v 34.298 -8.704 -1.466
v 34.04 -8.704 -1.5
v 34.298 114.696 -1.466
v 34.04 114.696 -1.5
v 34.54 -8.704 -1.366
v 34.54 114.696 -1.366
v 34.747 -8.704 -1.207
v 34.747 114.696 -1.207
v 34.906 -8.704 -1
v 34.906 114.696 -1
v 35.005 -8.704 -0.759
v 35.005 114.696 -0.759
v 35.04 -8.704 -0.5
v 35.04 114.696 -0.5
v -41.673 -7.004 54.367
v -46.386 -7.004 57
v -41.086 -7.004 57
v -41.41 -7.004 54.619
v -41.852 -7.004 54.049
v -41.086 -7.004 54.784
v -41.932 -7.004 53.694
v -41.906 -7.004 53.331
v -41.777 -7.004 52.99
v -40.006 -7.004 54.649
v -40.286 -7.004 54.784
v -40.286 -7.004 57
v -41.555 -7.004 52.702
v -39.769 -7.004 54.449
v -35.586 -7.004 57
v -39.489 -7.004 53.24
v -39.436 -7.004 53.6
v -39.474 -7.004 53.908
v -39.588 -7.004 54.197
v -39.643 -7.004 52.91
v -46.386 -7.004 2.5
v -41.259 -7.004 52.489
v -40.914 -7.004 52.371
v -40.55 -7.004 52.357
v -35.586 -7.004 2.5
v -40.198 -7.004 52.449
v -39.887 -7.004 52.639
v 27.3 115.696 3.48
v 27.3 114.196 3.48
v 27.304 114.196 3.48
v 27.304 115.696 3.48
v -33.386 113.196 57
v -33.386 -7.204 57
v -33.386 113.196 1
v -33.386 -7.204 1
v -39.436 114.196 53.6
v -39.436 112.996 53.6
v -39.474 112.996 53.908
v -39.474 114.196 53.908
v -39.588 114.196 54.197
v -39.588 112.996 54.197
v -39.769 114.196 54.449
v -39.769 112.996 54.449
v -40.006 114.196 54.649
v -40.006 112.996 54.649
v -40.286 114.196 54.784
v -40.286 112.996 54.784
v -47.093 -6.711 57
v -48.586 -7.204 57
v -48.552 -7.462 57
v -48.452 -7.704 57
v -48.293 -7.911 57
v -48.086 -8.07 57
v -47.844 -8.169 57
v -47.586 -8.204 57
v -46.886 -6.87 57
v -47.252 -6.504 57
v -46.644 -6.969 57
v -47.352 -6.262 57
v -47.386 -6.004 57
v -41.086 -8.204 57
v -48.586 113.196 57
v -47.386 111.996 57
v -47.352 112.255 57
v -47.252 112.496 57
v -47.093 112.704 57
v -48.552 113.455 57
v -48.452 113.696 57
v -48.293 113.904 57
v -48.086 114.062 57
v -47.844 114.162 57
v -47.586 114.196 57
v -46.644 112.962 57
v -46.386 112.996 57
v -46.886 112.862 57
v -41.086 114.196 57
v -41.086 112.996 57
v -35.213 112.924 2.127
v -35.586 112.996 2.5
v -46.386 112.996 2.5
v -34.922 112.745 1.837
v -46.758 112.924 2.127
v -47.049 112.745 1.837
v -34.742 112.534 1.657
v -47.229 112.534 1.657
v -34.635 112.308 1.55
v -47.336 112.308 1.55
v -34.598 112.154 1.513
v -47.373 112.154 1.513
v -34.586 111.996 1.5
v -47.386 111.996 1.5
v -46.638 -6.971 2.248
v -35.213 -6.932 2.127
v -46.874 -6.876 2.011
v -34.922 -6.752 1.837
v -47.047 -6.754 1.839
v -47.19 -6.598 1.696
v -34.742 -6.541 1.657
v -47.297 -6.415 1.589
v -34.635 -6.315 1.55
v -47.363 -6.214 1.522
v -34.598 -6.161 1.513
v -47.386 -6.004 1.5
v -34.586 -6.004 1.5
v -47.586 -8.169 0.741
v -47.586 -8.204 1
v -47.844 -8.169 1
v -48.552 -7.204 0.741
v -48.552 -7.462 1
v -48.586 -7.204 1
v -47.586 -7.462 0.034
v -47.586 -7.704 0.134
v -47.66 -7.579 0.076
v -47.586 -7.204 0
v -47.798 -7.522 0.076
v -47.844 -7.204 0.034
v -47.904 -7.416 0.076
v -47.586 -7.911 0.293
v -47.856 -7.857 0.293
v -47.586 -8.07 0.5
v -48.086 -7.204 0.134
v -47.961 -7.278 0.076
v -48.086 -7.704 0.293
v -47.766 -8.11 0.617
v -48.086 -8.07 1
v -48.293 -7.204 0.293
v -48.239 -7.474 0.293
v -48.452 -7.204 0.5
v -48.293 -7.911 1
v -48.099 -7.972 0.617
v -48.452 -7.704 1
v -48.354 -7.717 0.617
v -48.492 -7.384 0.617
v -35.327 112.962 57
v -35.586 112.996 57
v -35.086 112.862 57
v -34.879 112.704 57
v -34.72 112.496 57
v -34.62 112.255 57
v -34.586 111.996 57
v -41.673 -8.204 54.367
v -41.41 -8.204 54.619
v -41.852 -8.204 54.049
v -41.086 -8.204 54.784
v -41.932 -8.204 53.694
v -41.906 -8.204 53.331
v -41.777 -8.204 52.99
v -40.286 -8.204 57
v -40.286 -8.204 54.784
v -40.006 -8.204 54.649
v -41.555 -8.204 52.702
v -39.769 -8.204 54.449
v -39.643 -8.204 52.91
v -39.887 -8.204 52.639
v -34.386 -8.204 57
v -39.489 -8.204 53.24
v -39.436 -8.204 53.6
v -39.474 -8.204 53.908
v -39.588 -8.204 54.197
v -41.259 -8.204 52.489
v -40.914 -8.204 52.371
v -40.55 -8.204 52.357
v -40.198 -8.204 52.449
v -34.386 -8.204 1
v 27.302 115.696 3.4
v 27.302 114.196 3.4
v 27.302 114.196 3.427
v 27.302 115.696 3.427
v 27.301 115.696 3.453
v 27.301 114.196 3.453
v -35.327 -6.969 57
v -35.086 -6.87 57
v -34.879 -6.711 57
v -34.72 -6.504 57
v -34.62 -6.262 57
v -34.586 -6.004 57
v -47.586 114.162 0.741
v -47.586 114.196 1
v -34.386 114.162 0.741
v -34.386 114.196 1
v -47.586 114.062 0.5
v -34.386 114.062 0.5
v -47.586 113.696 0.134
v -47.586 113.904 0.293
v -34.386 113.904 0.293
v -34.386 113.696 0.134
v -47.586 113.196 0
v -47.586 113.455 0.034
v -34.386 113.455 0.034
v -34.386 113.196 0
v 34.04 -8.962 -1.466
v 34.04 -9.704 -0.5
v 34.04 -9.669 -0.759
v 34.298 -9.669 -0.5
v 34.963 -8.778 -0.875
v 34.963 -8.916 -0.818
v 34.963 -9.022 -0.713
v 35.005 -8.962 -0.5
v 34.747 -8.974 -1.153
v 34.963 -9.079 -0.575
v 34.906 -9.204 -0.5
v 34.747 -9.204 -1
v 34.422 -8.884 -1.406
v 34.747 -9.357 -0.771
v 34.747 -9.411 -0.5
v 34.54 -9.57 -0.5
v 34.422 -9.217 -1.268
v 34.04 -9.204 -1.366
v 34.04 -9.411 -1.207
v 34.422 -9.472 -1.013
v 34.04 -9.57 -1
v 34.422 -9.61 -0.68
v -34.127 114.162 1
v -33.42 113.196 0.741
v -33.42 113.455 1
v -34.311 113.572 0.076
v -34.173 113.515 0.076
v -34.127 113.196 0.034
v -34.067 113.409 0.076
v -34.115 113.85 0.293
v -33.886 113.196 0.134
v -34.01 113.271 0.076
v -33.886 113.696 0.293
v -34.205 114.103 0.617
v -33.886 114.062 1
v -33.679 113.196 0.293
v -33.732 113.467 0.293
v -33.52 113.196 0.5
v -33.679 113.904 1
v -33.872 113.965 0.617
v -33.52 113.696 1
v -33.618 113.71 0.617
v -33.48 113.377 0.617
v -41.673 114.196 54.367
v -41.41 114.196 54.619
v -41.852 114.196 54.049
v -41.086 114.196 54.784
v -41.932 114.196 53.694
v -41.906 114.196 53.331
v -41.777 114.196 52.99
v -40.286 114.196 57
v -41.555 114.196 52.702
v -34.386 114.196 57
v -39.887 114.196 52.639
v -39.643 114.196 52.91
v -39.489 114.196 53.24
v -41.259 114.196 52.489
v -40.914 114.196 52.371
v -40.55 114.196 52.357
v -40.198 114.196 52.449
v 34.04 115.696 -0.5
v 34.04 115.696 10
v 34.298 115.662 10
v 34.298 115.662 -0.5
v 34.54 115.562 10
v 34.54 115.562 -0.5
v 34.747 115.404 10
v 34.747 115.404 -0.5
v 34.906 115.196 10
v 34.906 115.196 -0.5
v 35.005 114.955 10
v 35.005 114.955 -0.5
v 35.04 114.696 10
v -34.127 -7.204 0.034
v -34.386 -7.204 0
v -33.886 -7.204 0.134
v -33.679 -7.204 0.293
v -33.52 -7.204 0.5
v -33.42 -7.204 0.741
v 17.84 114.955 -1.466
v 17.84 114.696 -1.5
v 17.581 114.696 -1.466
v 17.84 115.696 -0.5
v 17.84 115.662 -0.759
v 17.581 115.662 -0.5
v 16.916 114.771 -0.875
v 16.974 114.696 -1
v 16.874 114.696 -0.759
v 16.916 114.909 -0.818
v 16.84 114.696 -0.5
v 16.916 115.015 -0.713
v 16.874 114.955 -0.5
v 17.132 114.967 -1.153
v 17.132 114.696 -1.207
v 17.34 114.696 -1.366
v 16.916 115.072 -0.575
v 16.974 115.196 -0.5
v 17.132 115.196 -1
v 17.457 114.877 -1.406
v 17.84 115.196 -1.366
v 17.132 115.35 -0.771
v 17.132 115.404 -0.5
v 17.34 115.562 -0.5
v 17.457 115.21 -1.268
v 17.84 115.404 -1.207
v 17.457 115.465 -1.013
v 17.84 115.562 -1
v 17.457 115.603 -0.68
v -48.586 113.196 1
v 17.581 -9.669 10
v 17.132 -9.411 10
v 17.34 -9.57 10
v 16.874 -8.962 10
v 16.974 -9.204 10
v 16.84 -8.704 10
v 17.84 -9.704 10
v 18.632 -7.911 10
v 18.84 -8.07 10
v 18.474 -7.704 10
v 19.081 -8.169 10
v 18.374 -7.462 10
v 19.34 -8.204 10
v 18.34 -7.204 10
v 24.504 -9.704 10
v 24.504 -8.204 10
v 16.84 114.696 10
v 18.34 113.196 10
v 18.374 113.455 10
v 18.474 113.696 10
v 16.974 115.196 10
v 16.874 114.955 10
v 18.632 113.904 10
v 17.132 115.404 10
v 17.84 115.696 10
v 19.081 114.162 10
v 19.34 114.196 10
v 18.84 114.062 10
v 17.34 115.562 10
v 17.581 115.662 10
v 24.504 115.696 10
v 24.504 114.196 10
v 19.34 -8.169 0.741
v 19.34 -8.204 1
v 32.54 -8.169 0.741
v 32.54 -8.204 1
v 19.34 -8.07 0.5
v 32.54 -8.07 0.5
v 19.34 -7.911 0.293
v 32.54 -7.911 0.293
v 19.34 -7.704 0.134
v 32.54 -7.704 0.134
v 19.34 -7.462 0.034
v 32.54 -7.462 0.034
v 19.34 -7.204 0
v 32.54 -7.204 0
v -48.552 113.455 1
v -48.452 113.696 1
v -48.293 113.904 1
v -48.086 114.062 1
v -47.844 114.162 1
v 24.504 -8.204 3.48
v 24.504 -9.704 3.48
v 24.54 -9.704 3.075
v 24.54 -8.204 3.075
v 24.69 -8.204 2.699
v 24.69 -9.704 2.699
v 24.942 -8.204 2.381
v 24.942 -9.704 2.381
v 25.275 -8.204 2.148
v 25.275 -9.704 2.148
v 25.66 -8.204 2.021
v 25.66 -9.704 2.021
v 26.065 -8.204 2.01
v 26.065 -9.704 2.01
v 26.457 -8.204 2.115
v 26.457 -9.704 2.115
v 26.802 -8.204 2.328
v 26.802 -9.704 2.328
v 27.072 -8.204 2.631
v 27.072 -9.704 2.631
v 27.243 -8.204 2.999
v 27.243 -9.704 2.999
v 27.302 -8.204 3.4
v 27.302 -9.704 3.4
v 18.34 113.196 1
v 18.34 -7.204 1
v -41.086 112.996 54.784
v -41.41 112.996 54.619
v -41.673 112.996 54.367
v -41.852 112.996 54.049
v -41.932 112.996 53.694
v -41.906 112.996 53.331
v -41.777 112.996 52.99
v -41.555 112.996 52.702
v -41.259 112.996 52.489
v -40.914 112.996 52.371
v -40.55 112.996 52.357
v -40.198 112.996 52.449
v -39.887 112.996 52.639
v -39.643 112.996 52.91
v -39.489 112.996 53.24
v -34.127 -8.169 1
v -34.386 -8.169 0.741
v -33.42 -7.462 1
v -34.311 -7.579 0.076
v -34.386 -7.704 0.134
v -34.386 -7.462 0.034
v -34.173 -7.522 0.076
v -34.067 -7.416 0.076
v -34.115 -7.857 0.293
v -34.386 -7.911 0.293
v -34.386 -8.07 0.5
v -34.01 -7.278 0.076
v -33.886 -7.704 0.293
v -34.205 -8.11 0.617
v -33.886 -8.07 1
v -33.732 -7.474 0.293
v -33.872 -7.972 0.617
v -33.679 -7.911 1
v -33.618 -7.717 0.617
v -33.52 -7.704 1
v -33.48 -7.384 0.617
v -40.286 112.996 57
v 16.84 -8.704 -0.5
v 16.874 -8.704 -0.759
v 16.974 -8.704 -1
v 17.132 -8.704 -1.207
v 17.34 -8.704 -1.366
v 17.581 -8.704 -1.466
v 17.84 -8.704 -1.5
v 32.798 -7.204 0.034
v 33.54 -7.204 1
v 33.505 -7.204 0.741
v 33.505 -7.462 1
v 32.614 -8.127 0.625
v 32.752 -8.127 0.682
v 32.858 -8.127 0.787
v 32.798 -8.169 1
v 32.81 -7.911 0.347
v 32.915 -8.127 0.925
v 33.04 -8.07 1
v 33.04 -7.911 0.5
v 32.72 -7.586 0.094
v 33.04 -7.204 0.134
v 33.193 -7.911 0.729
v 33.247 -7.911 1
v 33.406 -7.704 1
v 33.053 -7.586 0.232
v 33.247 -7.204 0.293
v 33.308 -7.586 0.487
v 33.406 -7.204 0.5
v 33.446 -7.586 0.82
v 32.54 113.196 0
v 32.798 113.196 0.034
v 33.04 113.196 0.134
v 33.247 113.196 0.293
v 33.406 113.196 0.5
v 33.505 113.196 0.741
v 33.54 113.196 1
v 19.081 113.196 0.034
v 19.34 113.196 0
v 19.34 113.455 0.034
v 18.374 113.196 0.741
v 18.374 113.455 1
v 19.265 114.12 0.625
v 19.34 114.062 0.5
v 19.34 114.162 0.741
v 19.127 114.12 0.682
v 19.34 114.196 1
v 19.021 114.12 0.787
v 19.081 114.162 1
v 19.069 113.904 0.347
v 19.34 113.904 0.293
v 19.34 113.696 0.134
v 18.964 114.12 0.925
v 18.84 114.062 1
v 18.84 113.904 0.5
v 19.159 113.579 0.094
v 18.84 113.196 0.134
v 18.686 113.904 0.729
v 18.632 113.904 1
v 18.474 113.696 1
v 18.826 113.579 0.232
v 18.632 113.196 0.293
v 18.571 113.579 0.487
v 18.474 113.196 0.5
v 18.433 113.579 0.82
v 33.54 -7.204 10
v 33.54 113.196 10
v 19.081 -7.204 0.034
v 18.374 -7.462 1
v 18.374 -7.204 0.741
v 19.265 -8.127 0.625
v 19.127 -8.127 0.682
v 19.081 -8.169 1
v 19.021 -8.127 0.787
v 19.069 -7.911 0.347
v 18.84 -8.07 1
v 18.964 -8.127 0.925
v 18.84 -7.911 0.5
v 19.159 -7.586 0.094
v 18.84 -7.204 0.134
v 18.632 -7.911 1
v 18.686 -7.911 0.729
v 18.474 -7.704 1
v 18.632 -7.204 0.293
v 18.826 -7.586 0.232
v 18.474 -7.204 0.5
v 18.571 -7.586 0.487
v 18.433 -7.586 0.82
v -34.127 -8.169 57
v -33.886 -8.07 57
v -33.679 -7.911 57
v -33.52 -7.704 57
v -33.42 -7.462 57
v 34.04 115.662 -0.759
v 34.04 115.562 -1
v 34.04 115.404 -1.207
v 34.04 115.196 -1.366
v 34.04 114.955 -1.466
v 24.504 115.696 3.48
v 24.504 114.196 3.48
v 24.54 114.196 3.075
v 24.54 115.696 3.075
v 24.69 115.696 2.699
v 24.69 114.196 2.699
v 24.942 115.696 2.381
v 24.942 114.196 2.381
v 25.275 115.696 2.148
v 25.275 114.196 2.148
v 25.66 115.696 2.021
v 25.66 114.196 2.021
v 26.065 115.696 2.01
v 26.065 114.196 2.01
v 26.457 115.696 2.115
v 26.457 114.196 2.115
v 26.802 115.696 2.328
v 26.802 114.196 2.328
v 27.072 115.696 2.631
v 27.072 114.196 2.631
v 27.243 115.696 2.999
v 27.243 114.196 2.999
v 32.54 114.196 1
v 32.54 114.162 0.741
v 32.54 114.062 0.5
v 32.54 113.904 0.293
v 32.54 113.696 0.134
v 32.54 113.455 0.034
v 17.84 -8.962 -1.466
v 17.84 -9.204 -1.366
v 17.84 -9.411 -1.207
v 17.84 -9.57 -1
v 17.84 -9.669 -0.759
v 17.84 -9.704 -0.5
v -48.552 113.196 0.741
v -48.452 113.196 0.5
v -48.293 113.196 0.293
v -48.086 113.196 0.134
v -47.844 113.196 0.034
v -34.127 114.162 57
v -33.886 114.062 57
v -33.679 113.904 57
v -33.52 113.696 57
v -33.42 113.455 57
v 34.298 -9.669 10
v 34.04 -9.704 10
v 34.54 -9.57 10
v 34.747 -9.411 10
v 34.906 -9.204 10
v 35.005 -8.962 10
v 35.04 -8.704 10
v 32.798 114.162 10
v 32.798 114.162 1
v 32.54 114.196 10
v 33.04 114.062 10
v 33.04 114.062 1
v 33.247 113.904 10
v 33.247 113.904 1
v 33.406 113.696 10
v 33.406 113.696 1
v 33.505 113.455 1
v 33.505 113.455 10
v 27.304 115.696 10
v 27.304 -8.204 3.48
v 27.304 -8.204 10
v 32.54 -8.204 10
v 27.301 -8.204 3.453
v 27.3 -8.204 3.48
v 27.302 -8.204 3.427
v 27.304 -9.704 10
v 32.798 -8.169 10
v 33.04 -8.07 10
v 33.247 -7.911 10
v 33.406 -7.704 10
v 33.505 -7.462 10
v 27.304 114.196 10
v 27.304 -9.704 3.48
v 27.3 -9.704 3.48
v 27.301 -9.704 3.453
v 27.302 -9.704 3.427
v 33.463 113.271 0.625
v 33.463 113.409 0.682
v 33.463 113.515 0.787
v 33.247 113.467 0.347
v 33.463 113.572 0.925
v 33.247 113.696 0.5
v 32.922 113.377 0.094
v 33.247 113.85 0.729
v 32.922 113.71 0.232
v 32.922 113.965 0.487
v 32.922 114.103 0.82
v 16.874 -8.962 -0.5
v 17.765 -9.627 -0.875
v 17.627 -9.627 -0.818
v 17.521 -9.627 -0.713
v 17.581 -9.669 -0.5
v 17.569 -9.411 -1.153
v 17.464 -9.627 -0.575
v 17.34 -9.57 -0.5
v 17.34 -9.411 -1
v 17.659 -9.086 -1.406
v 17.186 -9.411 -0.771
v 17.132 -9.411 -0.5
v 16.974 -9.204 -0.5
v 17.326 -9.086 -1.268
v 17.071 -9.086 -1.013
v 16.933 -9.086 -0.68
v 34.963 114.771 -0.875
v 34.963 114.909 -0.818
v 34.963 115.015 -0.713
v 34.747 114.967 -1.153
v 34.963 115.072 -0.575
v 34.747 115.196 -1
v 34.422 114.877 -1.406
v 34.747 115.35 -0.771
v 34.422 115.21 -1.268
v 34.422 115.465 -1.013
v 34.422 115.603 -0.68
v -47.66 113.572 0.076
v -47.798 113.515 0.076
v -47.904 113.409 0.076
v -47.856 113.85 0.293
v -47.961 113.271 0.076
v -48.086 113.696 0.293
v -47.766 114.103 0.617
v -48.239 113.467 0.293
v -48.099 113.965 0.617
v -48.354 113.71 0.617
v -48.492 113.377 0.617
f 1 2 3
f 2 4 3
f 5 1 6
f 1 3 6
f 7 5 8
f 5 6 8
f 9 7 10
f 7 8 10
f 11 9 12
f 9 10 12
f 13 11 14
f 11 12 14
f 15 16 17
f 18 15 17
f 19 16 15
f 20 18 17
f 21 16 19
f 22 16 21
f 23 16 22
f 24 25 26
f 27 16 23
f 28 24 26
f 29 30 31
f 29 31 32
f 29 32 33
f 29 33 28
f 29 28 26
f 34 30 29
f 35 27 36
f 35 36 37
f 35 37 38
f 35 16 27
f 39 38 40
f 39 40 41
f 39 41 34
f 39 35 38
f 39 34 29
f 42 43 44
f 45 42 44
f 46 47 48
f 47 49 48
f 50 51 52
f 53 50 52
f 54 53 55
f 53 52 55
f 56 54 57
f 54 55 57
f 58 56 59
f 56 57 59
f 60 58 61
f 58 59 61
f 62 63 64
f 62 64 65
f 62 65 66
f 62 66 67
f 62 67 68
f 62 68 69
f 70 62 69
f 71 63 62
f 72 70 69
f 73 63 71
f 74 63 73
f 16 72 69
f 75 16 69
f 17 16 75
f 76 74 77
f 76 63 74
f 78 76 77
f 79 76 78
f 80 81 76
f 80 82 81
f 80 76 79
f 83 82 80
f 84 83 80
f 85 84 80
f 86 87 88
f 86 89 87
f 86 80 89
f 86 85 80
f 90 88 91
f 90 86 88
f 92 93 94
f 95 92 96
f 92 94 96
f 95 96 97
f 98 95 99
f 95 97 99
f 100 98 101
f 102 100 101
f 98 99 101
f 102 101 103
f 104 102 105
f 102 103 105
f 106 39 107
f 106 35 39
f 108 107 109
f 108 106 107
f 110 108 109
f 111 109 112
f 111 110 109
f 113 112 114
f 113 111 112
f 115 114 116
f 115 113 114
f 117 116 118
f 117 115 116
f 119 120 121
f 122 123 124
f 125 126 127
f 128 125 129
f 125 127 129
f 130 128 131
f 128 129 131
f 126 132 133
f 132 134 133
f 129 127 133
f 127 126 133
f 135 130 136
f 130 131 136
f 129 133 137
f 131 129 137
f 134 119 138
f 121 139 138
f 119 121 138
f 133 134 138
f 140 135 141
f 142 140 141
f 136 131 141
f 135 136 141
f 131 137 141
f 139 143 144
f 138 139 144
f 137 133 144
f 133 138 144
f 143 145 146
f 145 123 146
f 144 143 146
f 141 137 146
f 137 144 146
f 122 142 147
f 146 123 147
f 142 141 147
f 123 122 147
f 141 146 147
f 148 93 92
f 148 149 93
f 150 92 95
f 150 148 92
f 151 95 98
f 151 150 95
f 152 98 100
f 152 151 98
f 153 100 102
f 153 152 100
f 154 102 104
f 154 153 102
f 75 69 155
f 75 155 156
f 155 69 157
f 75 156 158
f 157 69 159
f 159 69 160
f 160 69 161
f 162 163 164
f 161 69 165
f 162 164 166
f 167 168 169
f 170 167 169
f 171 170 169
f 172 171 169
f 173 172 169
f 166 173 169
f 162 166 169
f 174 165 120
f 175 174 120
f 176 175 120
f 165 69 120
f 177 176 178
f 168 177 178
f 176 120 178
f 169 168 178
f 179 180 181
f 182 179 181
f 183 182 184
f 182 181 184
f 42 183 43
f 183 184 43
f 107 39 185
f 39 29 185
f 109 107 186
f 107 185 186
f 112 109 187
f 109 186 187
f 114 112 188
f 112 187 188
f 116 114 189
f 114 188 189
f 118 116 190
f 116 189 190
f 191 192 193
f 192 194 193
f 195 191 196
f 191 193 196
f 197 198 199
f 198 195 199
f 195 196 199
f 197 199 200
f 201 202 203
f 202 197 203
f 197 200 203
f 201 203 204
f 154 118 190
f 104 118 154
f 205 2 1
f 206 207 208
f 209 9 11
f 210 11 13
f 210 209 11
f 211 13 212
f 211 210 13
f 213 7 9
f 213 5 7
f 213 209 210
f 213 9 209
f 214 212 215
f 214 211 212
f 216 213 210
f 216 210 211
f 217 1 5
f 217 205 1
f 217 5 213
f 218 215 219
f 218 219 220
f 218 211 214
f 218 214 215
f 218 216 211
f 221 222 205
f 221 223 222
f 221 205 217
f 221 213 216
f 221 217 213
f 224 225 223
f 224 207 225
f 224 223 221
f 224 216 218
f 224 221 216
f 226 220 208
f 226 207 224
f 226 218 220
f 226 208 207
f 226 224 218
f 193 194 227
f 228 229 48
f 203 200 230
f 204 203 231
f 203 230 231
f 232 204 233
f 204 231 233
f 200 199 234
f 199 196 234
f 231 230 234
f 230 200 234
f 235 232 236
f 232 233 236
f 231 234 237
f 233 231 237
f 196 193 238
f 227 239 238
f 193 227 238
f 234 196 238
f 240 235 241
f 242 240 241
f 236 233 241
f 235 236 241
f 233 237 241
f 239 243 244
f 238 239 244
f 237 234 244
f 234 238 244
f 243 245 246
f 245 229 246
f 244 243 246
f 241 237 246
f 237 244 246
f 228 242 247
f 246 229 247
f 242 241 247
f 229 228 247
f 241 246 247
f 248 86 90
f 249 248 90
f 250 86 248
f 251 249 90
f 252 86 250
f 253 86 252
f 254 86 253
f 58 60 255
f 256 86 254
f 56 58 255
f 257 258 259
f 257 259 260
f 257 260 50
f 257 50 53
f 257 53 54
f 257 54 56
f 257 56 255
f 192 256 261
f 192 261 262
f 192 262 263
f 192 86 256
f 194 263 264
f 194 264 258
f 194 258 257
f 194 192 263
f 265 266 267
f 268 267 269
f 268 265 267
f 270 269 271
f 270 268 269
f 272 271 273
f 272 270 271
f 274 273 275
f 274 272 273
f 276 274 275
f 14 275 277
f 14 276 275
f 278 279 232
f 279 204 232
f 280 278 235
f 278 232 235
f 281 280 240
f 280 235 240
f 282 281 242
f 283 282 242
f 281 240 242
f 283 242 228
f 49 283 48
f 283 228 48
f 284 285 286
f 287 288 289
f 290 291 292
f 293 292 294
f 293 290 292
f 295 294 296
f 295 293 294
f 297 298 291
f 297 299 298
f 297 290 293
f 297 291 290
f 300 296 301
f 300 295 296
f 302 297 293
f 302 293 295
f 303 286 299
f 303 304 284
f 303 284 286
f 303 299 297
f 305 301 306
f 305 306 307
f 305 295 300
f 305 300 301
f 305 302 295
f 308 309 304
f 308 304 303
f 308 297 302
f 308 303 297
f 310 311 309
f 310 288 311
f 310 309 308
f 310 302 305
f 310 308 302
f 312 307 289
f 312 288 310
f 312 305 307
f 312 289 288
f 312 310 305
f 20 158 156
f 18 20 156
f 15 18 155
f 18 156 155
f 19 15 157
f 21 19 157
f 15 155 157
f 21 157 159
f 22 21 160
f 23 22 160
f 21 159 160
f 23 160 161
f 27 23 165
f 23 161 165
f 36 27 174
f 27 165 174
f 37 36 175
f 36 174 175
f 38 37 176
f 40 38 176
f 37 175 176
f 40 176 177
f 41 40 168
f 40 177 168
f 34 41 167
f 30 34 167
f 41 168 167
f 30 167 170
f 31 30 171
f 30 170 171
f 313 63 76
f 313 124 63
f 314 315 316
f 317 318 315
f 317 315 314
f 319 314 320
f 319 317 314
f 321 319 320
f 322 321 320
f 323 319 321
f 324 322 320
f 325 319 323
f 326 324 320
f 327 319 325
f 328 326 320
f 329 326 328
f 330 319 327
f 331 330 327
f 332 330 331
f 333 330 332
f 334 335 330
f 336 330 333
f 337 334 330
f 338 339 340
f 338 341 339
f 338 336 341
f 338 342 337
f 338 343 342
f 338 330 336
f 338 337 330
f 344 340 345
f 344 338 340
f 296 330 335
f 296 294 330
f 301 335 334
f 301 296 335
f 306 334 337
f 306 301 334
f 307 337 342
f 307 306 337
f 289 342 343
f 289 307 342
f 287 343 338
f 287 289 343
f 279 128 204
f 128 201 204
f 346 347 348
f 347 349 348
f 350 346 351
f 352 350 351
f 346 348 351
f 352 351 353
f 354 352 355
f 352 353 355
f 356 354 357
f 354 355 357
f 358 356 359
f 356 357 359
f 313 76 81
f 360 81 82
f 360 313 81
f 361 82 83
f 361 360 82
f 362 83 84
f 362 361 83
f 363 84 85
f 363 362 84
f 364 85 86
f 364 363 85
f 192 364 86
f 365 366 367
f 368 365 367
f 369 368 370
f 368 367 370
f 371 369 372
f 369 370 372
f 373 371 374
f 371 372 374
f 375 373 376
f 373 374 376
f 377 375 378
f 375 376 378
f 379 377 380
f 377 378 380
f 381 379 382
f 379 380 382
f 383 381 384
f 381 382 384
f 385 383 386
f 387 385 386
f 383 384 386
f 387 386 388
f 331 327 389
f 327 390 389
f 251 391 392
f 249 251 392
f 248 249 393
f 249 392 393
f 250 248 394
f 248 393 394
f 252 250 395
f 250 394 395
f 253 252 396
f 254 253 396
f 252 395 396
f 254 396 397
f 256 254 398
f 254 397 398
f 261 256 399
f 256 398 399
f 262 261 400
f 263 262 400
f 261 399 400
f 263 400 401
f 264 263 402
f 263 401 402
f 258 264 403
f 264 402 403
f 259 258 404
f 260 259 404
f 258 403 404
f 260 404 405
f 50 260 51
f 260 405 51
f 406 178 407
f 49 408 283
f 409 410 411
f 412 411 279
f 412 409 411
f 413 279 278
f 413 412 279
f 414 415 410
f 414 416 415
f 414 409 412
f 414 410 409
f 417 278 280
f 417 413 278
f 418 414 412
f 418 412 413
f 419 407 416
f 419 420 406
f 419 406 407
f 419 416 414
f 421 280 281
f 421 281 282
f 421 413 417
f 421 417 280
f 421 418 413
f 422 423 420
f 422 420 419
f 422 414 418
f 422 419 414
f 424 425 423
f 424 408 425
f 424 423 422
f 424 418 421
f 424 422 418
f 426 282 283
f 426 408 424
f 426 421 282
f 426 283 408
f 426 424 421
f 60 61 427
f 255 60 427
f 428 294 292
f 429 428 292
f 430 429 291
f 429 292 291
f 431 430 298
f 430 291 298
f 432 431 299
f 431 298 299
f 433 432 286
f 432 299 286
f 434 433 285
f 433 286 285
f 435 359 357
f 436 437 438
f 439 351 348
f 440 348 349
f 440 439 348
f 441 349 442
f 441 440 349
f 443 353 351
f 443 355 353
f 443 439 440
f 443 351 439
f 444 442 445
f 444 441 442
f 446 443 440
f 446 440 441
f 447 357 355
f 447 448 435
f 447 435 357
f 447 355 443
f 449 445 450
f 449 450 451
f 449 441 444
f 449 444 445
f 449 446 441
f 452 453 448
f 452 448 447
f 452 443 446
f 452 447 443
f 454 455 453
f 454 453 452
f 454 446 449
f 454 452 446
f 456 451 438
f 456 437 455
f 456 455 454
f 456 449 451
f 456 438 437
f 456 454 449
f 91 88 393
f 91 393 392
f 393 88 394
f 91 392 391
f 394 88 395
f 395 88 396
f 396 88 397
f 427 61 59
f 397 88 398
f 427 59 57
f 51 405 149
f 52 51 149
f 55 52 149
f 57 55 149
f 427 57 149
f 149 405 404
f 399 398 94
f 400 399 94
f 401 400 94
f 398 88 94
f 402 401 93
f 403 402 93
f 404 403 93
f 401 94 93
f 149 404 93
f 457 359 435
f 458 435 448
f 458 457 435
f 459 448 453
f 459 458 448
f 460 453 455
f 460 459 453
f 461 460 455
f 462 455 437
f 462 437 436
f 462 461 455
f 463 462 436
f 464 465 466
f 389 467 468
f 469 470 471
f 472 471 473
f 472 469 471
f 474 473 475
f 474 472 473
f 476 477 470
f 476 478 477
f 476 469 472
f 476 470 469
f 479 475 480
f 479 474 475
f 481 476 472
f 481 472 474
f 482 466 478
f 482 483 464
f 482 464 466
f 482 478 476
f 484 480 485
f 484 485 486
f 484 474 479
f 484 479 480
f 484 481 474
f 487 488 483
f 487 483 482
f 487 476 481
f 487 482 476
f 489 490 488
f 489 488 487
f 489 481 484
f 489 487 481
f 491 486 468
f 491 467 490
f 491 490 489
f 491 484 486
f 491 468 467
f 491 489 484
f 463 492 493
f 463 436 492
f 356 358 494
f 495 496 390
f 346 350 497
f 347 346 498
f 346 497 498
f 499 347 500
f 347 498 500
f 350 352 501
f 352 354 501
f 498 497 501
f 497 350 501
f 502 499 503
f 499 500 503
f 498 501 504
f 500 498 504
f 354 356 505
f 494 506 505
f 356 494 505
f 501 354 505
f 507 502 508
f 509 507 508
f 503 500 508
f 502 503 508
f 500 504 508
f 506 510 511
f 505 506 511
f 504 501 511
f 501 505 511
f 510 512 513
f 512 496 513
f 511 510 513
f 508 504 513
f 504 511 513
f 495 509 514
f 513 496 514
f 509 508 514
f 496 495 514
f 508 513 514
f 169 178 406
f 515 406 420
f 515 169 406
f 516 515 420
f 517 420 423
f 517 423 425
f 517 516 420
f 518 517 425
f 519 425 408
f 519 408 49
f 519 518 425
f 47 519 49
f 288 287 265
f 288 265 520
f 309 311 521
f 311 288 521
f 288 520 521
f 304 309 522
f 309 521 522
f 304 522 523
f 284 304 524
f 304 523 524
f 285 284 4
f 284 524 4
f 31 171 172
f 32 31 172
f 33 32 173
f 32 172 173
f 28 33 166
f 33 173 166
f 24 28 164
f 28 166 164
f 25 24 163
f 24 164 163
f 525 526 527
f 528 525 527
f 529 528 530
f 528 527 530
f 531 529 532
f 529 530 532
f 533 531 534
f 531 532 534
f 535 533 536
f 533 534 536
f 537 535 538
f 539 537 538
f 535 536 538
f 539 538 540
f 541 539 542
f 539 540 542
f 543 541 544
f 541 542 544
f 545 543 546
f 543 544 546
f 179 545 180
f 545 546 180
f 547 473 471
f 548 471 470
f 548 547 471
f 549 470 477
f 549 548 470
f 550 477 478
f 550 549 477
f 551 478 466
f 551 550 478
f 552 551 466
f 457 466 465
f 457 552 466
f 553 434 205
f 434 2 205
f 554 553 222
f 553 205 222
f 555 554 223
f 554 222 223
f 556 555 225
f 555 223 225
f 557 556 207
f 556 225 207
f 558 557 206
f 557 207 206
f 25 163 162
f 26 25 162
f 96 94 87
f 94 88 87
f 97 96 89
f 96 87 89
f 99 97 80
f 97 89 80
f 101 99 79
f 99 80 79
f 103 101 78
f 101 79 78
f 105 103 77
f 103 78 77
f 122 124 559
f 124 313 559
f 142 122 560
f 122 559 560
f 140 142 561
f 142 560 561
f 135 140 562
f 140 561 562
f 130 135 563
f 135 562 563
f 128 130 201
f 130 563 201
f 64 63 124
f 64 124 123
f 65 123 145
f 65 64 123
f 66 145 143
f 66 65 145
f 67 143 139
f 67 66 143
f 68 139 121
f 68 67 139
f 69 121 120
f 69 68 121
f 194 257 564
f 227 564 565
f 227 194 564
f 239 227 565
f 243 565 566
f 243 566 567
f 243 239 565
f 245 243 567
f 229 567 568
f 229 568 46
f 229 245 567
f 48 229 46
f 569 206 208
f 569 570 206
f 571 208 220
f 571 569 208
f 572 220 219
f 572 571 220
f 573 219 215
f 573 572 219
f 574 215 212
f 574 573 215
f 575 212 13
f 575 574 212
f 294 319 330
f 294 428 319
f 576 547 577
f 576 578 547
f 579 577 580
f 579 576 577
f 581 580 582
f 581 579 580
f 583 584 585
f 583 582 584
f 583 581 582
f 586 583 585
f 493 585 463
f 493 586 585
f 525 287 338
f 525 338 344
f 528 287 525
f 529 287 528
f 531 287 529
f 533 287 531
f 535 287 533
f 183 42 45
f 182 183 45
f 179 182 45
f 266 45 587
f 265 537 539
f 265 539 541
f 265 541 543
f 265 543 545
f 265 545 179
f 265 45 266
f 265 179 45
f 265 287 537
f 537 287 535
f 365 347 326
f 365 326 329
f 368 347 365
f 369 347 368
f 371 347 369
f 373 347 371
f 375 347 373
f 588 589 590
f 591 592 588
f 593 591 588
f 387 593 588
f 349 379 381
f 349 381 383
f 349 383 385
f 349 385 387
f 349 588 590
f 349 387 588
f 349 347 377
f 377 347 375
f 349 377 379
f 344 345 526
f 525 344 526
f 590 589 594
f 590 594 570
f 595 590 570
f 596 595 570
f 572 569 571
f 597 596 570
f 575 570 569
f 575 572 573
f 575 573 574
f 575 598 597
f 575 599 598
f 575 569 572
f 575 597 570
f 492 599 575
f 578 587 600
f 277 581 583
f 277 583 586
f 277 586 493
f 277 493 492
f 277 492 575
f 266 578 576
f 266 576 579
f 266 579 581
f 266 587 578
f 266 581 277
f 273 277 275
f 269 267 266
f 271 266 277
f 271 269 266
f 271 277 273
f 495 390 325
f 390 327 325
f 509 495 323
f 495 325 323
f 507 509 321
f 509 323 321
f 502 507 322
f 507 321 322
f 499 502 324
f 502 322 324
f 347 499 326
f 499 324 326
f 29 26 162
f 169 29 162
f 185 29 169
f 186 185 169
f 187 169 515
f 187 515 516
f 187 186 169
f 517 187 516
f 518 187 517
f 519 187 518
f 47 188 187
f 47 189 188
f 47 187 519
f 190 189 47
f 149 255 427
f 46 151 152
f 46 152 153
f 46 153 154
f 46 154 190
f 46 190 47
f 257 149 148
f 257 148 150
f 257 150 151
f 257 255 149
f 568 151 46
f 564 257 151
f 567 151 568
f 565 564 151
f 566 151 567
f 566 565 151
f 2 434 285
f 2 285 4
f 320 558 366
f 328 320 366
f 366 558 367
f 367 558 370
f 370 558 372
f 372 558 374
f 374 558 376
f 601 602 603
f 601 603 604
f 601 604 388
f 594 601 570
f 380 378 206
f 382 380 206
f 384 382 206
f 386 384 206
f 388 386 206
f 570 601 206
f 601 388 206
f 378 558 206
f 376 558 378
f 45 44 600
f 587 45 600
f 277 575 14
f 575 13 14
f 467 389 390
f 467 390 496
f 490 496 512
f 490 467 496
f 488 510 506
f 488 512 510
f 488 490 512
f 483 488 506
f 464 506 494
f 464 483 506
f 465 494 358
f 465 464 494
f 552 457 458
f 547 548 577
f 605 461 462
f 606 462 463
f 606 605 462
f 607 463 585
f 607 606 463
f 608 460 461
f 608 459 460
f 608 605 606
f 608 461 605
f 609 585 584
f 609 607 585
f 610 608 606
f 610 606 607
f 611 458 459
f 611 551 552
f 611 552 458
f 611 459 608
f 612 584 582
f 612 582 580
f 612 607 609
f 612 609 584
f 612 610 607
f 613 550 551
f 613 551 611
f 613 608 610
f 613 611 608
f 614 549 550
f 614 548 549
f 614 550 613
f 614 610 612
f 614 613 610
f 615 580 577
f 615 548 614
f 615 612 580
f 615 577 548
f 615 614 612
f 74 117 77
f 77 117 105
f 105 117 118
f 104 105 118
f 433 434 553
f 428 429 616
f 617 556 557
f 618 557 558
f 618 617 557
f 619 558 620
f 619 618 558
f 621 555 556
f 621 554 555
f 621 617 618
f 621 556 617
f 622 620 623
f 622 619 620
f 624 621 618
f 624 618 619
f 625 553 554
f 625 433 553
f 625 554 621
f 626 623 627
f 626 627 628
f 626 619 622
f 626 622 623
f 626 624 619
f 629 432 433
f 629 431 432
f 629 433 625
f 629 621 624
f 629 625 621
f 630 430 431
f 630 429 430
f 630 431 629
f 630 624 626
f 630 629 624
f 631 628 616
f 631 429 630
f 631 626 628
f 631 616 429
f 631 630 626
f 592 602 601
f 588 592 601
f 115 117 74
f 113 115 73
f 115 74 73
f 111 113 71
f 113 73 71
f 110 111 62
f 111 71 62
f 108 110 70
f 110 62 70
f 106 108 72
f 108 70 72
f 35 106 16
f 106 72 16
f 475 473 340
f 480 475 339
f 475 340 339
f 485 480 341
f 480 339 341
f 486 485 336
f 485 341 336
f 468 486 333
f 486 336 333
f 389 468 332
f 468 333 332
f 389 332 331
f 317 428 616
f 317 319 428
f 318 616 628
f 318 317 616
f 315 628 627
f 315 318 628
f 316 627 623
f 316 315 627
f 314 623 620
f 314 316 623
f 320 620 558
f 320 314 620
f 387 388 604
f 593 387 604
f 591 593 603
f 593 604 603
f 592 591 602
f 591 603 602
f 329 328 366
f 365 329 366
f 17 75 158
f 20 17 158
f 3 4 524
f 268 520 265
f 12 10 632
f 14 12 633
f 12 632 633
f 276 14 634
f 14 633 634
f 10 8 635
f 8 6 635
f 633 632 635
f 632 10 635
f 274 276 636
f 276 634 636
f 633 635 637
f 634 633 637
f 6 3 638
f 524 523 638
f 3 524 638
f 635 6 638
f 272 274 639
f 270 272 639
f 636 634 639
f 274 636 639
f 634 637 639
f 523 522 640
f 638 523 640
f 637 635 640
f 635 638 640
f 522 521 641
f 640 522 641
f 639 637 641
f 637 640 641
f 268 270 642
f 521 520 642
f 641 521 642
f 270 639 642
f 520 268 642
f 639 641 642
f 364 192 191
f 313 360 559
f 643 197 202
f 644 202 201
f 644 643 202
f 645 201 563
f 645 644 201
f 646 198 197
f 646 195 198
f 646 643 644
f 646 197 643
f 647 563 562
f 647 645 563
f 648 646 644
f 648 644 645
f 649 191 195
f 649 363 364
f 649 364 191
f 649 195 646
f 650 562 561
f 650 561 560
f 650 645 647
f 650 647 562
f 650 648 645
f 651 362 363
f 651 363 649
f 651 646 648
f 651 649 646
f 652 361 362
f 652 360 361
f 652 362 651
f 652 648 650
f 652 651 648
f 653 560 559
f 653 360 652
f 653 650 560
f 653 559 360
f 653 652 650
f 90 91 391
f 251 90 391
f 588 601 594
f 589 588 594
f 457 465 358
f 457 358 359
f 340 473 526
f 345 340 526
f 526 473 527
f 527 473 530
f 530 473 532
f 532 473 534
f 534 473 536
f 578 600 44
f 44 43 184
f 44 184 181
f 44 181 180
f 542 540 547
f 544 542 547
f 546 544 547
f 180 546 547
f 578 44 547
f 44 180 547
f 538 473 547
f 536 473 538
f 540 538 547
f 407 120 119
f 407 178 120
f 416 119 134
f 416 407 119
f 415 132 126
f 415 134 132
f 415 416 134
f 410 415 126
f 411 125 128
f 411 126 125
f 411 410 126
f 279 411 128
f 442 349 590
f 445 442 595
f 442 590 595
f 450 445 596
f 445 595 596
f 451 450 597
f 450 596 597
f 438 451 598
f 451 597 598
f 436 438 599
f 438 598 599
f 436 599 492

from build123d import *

# Parameters (mm, degrees)
F0_W     = 15.2
F0_H     = 122.4
F0_W_2   = 12.8
F0_H_2   = 120
F1_DEPTH = 1.5
F2_DEPTH = 57
F4_DEPTH = 122.401
F0_W_3   = 18.2
F0_H_3   = 125.4
F5_DEPTH = 1.5
F6_DEPTH = 10
F8_DEPTH = 125.401
F9_R     = 1
F9_2_R   = 1


with BuildPart() as f1:
    # F0 (on Top) → F1 (new body)
    with BuildSketch(Plane.XY):
        with Locations((-40.9856793821, 52.9964423075)):
            Rectangle(F0_W, F0_H)
        with Locations((-40.9856793821, 52.9964423075)):
            Rectangle(F0_W_2, F0_H_2, mode=Mode.SUBTRACT)
        with Locations((-40.9856793821, 52.9964423075)):
            Rectangle(F0_W_2, F0_H_2)
    extrude(amount=F1_DEPTH)

    # F0 (on Top) → F2 (join)
    with BuildSketch(Plane.XY):
        with Locations((-40.9856793821, 52.9964423075)):
            Rectangle(F0_W, F0_H)
        with Locations((-40.9856793821, 52.9964423075)):
            Rectangle(F0_W_2, F0_H_2, mode=Mode.SUBTRACT)
    extrude(amount=F2_DEPTH)

    # F3 (on face) → F4 (cut, through all)
    with BuildSketch(Plane.XZ.offset(8.2035576925)):
        with BuildLine():
            ThreePointArc((-41.0856793821, 54.7842719282), (-41.4145483689, 52.5844951994), (-39.4356793821, 53.6))
            ThreePointArc((-39.4356793821, 53.6), (-39.6701745815, 54.3288689869), (-40.2856793821, 54.7842719282))
            Line((-40.2856793821, 54.7842719282), (-40.2856793821, 53.6))
            Line((-40.2856793821, 53.6), (-41.0856793821, 53.6))
            Line((-41.0856793821, 53.6), (-41.0856793821, 54.7842719282))
        make_face()
        with BuildLine():
            ThreePointArc((-41.0856793821, 54.7842719282), (-40.6856793821, 54.85), (-40.2856793821, 54.7842719282))
            Line((-40.2856793821, 54.7842719282), (-40.2856793821, 57))
            Line((-40.2856793821, 57), (-41.0856793821, 57))
            Line((-41.0856793821, 57), (-41.0856793821, 54.7842719282))
        make_face()
        with BuildLine():
            Line((-40.2856793821, 53.6), (-40.2856793821, 54.7842719282))
            ThreePointArc((-40.2856793821, 54.7842719282), (-40.6856793821, 54.85), (-41.0856793821, 54.7842719282))
            Line((-41.0856793821, 54.7842719282), (-41.0856793821, 53.6))
            Line((-41.0856793821, 53.6), (-40.2856793821, 53.6))
        make_face()
    extrude(amount=-F4_DEPTH, mode=Mode.SUBTRACT)

    # F9
    f9_edges = [f1.edges().sort_by_distance(p)[0] for p in [
        (-33.385679, -8.203558, 28.5),
        (-48.585679, -8.203558, 28.5),
        (-33.385679, 114.196442, 28.5),
        (-47.385679, 112.996442, 29.25),
        (-48.585679, 114.196442, 28.5),
        (-34.585679, -7.003558, 29.25),
        (-47.385679, -7.003558, 29.25),
        (-34.585679, 112.996442, 29.25),
        (-40.985679, -7.003558, 1.5),
        (-40.985679, 112.996442, 1.5),
        (-40.985679, -8.203558, 0),
        (-40.985679, 114.196442, 0),
        (-48.585679, 52.996442, 0),
        (-33.385679, 52.996442, 0),
    ]]
    fillet(f9_edges, radius=F9_R)


with BuildPart() as f5:
    # F0 (on Top) → F5 (new body)
    with BuildSketch(Plane.XY):
        with Locations((25.9395489454, 52.9964423075)):
            Rectangle(F0_W_3, F0_H_3)
        with Locations((25.9395489454, 52.9964423075)):
            Rectangle(F0_W, F0_H, mode=Mode.SUBTRACT)
        with Locations((25.9395489454, 52.9964423075)):
            Rectangle(F0_W, F0_H)
    extrude(amount=-F5_DEPTH)

    # F0 (on Top) → F6 (join)
    with BuildSketch(Plane.XY):
        with Locations((25.9395489454, 52.9964423075)):
            Rectangle(F0_W_3, F0_H_3)
        with Locations((25.9395489454, 52.9964423075)):
            Rectangle(F0_W, F0_H, mode=Mode.SUBTRACT)
    extrude(amount=F6_DEPTH)

    # F7 (on face) → F8 (cut, through all)
    with BuildSketch(Plane.XZ.offset(9.7035576925)):
        with BuildLine():
            ThreePointArc((27.2995661135, 3.4795490896), (25.9018279612, 4.8), (24.5040898089, 3.4795490896))
            Line((24.5040898089, 3.4795490896), (27.2995661135, 3.4795490896))
        make_face()
        with BuildLine():
            Line((27.2995661135, 3.4795490896), (24.5040898089, 3.4795490896))
            ThreePointArc((24.5040898089, 3.4795490896), (25.8620373417, 2.0005655762), (27.3018279612, 3.4))
            ThreePointArc((27.3018279612, 3.4), (27.301262385, 3.4397906195), (27.2995661135, 3.4795490896))
        make_face()
        with BuildLine():
            Line((24.5040898089, 10), (24.5040898089, 3.4795490896))
            ThreePointArc((24.5040898089, 3.4795490896), (25.9018279612, 4.8), (27.2995661135, 3.4795490896))
            Line((27.2995661135, 3.4795490896), (27.3040898089, 3.4795490896))
            Line((27.3040898089, 3.4795490896), (27.3040898089, 10))
            Line((27.3040898089, 10), (24.5040898089, 10))
        make_face()
    extrude(amount=-F8_DEPTH, mode=Mode.SUBTRACT)

    # F9#2
    f9_2_edges = [f5.edges().sort_by_distance(p)[0] for p in [
        (18.339549, 52.996442, 0),
        (25.939549, 114.196442, 0),
        (33.539549, 52.996442, 0),
        (25.939549, -8.203558, 0),
        (25.939549, 115.696442, -1.5),
        (16.839549, 52.996442, -1.5),
        (25.939549, -9.703558, -1.5),
        (35.039549, 52.996442, -1.5),
        (35.039549, -9.703558, 4.25),
        (16.839549, -9.703558, 4.25),
        (35.039549, 115.696442, 4.25),
        (16.839549, 115.696442, 4.25),
        (18.339549, -8.203558, 5),
        (33.539549, -8.203558, 5),
        (18.339549, 114.196442, 5),
        (33.539549, 114.196442, 5),
    ]]
    fillet(f9_2_edges, radius=F9_2_R)


solid = Compound([f1.part, f5.part])
